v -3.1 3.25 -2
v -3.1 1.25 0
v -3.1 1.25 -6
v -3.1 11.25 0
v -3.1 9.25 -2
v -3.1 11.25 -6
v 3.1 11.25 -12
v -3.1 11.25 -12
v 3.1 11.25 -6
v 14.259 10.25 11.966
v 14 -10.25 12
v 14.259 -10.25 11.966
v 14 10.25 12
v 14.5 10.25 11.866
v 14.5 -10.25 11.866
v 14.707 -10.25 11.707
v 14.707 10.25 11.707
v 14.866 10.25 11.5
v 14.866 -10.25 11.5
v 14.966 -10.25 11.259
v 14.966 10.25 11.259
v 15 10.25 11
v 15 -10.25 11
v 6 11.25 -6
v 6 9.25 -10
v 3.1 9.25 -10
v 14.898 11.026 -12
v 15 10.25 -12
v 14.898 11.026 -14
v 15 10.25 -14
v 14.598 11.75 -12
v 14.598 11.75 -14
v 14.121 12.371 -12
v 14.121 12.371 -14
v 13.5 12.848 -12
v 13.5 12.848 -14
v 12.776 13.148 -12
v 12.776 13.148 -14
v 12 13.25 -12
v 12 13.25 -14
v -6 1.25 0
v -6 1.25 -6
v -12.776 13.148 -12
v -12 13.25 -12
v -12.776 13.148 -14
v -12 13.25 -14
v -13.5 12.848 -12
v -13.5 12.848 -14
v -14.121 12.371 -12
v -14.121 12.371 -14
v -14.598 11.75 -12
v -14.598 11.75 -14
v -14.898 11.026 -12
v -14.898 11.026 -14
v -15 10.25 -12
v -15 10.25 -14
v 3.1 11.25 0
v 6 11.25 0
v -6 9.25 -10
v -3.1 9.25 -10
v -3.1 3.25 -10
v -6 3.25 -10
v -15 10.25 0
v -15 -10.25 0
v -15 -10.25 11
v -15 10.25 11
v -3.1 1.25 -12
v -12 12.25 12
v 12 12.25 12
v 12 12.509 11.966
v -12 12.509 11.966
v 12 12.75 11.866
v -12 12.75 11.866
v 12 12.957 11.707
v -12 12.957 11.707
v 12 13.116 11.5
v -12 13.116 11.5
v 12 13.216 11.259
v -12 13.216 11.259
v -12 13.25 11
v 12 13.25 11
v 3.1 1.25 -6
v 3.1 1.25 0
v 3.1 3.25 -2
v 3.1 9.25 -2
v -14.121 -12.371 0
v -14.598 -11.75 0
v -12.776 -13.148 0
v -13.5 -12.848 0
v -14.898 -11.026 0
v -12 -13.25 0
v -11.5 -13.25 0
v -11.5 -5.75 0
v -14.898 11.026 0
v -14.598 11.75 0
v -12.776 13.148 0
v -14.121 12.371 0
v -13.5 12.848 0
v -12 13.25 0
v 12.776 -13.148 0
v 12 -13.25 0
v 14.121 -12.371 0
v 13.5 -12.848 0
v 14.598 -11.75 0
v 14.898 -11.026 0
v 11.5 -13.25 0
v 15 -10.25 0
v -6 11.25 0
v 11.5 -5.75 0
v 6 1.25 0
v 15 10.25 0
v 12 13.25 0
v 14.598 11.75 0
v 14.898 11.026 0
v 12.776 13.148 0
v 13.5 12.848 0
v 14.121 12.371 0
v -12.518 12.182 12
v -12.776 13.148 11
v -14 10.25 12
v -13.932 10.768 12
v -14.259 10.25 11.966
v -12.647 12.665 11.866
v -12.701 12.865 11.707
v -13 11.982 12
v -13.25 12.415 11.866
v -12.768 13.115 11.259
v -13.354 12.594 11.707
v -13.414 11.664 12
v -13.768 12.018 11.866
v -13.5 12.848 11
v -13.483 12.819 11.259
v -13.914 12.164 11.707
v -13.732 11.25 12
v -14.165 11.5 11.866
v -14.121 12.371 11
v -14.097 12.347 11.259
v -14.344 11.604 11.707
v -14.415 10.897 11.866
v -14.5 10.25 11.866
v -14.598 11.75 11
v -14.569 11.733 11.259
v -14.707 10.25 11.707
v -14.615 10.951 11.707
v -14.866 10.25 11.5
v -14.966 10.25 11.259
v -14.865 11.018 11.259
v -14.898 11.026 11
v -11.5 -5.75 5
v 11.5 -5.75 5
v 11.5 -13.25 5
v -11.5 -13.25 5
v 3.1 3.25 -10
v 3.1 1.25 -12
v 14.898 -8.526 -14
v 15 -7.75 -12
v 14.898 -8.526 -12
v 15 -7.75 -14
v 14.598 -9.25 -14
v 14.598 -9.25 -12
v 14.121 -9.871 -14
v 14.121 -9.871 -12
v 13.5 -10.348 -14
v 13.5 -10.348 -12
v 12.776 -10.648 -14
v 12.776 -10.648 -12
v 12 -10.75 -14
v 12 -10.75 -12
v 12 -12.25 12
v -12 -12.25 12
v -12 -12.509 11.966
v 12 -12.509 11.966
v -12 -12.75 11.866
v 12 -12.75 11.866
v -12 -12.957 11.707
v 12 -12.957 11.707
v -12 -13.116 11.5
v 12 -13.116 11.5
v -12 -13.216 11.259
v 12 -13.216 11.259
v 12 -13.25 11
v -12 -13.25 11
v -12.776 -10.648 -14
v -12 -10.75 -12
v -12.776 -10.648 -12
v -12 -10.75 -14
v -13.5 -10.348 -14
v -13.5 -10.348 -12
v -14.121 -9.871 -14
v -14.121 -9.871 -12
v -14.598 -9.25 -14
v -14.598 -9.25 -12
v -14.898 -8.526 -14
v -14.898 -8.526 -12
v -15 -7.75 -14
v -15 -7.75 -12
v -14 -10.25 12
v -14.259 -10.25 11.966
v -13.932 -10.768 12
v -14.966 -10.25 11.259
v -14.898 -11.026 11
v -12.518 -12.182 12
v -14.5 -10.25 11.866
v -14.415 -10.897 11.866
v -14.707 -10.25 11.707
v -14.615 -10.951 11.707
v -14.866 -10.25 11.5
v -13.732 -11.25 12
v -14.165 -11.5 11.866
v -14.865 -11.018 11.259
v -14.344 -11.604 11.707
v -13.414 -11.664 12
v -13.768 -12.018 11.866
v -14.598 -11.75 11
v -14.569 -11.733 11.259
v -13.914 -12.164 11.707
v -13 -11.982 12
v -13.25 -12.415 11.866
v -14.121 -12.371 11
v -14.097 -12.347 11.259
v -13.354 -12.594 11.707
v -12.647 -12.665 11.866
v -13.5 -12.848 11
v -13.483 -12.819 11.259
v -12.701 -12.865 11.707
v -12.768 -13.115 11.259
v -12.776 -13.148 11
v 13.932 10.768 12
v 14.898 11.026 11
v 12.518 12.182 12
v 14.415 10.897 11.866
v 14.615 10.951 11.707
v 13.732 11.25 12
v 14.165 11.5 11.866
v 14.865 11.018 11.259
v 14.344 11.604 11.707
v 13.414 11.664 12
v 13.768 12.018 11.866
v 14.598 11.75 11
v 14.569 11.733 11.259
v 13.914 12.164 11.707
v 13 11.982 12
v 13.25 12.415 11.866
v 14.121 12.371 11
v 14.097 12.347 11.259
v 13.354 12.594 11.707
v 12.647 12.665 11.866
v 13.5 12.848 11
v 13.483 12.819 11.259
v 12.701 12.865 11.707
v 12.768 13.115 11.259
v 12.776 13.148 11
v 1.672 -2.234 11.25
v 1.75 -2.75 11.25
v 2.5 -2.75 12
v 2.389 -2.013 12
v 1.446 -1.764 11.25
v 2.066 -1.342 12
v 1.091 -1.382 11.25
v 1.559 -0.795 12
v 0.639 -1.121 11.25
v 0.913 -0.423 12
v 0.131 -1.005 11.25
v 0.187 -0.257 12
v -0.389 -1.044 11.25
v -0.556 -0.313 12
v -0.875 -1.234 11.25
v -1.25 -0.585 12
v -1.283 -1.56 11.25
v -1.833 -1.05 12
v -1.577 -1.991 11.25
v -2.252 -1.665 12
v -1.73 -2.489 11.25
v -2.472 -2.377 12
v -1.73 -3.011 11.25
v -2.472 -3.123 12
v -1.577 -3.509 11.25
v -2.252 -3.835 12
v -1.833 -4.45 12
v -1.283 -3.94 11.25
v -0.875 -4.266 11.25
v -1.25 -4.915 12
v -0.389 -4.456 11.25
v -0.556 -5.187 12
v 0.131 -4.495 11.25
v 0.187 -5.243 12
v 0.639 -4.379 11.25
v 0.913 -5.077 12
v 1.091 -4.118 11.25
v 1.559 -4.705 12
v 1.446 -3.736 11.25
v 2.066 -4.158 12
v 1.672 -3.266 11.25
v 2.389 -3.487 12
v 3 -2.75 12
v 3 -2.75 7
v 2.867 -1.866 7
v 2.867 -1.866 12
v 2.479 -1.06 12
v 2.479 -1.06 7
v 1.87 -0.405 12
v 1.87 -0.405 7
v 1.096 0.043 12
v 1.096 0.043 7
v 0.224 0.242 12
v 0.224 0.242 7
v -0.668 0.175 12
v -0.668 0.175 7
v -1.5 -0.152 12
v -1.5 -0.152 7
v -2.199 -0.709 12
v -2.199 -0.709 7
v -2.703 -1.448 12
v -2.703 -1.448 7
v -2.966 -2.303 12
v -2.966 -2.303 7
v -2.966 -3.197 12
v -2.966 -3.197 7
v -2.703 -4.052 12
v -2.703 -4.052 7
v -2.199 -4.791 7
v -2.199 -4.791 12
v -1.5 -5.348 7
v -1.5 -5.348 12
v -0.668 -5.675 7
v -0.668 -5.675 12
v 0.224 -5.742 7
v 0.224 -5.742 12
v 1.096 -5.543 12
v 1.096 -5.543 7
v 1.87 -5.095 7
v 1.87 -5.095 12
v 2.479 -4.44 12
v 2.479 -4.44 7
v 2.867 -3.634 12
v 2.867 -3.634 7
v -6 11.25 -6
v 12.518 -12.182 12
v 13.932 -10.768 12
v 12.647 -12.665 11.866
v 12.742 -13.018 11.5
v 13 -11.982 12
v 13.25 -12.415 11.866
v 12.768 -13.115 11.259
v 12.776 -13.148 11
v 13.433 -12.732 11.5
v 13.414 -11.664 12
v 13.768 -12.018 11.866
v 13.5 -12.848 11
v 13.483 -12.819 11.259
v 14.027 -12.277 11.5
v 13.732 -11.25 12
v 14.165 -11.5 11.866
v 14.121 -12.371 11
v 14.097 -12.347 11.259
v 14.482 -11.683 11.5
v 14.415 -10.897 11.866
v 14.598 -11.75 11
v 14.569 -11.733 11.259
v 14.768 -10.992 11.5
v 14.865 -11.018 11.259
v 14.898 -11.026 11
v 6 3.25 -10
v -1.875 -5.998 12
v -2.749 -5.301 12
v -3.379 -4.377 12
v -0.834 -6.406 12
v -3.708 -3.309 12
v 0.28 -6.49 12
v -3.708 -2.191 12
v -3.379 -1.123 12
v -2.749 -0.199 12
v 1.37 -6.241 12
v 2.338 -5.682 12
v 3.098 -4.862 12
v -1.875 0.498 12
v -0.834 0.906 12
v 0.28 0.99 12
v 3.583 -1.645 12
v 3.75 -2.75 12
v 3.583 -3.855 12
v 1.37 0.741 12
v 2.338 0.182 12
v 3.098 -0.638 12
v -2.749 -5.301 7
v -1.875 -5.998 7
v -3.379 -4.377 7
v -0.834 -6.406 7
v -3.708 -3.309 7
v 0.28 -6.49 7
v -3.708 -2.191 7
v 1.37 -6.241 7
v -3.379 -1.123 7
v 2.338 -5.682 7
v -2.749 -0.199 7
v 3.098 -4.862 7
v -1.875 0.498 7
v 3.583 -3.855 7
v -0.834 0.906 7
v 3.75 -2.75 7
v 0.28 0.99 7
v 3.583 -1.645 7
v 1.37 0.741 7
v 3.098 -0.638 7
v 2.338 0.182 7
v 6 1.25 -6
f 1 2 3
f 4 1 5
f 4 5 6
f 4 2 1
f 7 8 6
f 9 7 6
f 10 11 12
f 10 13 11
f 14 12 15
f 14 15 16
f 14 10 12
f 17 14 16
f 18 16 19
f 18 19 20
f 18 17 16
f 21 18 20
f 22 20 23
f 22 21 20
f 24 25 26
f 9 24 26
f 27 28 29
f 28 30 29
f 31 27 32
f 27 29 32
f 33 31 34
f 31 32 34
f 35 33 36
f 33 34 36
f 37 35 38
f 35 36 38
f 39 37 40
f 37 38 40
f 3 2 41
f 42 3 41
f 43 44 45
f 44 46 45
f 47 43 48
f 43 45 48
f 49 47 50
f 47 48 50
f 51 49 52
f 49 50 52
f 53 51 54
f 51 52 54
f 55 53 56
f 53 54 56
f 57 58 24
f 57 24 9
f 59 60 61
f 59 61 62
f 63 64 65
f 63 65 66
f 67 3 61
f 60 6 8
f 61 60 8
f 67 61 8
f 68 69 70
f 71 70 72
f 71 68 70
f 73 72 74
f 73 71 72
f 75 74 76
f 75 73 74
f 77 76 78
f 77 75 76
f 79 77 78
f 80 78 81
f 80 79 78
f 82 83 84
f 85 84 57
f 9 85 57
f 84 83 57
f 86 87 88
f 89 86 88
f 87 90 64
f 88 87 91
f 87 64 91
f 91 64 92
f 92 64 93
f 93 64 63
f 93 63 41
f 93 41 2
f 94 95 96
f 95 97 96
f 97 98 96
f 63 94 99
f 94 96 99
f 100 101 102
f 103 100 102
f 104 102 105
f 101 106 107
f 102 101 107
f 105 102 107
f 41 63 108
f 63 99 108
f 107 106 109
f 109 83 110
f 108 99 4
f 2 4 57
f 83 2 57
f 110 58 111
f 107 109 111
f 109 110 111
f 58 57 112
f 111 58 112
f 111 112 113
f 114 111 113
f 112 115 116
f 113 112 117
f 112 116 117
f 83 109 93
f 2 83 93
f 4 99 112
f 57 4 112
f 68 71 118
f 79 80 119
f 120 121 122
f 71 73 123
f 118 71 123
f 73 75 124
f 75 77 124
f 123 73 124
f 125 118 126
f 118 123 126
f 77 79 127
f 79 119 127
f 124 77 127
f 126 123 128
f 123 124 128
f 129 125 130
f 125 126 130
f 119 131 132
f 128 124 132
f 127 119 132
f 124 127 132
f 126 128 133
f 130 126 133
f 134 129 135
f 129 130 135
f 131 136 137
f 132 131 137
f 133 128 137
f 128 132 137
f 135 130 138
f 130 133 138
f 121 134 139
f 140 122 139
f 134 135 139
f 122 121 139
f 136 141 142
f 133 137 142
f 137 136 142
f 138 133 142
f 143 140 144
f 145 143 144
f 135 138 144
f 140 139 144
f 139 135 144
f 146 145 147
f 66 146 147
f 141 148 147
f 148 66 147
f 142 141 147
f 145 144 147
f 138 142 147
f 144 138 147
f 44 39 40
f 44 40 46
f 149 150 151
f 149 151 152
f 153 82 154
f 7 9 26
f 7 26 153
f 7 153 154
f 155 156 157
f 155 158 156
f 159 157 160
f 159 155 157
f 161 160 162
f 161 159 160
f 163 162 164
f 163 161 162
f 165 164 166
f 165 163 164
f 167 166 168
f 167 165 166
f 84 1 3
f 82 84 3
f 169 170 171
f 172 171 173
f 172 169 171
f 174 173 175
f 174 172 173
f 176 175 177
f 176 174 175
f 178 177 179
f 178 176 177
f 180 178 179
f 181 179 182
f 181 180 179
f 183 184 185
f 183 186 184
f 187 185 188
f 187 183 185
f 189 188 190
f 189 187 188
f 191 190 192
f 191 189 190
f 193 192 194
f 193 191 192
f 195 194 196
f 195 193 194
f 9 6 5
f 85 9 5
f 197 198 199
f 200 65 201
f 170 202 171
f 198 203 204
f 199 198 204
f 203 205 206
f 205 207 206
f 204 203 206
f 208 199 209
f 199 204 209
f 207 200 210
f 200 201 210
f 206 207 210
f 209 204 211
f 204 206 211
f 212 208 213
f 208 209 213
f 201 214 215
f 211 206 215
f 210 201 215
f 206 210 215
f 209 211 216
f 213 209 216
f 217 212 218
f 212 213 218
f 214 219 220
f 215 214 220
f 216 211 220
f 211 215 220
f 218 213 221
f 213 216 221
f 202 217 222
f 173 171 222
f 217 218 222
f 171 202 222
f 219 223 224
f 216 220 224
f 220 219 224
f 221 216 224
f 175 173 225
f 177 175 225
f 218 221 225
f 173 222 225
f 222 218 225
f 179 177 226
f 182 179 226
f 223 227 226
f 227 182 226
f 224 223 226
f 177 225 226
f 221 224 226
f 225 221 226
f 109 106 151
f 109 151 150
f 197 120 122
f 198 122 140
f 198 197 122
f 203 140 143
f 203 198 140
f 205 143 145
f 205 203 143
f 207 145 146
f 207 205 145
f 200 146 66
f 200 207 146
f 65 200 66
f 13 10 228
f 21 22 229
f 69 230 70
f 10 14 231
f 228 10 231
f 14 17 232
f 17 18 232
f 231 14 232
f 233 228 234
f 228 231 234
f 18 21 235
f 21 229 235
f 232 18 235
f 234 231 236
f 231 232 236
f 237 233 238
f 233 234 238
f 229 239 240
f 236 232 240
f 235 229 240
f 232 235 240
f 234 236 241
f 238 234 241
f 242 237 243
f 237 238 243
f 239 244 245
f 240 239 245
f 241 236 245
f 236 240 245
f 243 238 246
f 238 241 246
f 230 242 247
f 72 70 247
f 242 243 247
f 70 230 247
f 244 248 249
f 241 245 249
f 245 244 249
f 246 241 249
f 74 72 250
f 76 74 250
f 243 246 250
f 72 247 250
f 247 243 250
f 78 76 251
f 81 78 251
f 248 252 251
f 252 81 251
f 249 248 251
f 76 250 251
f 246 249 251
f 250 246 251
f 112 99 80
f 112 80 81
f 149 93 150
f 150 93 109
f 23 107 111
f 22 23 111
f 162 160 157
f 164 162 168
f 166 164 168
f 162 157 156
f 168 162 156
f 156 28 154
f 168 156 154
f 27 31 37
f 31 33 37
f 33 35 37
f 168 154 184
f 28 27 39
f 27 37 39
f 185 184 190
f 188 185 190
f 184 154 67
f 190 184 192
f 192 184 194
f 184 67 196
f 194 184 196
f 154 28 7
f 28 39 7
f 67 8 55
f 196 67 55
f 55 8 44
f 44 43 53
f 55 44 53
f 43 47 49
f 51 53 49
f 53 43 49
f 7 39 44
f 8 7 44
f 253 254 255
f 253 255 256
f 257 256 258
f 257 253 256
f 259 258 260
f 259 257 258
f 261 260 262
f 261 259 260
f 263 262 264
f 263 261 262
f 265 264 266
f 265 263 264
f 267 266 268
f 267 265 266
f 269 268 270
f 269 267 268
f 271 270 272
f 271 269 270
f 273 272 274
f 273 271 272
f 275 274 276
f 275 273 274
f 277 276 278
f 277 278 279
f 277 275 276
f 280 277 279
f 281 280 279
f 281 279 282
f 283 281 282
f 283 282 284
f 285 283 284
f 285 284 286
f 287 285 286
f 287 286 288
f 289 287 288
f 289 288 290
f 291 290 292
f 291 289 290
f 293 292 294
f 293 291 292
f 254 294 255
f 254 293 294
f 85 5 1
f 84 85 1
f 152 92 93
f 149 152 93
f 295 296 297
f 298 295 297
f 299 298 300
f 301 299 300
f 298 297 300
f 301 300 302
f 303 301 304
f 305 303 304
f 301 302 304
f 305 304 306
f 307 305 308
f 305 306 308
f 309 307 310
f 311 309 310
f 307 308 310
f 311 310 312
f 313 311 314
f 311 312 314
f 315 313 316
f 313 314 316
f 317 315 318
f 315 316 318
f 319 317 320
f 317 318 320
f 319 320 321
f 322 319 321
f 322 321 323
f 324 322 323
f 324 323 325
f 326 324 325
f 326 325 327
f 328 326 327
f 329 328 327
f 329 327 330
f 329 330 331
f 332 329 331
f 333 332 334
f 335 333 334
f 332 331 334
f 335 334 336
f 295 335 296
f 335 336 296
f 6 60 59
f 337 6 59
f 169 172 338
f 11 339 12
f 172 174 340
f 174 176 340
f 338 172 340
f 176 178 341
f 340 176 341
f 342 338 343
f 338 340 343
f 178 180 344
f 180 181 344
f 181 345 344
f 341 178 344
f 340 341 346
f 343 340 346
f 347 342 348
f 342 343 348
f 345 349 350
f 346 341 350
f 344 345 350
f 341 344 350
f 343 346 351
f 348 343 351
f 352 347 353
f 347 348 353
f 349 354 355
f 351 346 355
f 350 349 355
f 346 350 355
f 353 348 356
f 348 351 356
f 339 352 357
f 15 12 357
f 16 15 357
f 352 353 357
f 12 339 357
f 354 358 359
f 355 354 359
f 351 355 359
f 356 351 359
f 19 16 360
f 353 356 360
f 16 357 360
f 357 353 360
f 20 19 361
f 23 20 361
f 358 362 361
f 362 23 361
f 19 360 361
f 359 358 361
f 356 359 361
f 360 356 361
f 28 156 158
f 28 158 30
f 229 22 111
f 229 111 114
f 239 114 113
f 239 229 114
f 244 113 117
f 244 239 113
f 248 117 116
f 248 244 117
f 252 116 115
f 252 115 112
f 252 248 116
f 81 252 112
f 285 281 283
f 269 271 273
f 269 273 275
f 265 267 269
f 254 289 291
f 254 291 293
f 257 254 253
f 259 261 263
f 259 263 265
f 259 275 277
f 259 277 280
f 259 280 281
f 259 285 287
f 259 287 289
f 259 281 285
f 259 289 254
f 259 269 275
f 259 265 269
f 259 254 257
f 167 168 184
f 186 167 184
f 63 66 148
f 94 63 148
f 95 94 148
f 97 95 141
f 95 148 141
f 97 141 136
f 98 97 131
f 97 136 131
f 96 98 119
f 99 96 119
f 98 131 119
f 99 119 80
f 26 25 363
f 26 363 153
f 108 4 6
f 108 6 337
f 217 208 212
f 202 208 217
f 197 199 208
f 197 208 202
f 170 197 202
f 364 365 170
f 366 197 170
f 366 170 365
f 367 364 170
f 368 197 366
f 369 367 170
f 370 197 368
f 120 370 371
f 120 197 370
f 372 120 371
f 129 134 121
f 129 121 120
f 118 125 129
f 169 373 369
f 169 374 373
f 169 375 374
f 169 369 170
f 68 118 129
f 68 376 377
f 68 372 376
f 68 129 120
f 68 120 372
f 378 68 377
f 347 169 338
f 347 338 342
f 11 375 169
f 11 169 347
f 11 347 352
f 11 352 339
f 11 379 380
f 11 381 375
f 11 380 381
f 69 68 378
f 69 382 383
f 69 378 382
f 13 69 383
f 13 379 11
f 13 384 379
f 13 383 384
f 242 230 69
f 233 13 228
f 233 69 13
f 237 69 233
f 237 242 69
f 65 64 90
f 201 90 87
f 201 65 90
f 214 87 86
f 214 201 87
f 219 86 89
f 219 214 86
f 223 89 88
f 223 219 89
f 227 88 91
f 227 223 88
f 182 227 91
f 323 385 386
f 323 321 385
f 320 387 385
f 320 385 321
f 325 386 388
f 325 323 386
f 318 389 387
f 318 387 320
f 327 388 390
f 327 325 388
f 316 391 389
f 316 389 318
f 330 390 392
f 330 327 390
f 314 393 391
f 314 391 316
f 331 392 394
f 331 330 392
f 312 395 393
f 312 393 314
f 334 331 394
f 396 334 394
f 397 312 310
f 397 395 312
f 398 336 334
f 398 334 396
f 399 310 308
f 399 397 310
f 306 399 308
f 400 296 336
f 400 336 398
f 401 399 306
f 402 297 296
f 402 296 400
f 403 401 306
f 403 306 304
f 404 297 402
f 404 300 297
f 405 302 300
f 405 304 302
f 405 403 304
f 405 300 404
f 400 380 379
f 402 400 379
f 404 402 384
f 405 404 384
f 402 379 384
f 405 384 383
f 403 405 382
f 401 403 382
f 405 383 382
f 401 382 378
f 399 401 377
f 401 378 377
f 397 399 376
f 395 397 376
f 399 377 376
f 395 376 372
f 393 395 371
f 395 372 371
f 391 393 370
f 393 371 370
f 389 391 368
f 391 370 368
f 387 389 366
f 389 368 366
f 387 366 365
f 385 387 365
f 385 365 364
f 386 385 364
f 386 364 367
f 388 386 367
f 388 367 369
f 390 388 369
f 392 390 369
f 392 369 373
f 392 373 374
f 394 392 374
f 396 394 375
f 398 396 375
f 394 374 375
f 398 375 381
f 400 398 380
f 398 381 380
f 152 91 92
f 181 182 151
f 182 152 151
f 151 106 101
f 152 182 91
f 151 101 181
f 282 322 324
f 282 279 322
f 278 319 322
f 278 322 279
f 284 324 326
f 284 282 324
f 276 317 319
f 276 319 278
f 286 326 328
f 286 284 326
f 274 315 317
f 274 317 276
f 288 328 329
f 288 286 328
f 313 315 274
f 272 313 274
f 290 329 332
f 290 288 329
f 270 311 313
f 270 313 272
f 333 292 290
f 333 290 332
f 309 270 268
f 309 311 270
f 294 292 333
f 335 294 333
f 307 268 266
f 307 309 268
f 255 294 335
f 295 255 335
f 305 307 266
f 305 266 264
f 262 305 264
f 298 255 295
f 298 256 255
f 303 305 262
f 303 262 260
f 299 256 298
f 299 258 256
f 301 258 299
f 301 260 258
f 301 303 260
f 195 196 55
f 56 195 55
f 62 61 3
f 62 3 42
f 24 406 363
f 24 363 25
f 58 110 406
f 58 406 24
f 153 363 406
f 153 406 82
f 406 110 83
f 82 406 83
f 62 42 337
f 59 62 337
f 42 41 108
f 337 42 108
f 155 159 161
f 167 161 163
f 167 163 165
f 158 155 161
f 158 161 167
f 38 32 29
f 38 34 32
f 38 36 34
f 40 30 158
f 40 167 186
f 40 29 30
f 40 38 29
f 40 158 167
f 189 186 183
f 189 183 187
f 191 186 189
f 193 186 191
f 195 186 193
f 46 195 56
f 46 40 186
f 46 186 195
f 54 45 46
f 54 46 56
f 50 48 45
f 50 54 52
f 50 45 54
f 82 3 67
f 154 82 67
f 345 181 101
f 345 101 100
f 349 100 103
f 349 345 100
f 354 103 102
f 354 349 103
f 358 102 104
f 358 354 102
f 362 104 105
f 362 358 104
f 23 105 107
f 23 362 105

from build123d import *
from OCP.BRepFilletAPI import BRepFilletAPI_MakeChamfer

# Parameters (mm, degrees)
SKETCH1_W           = 30
SKETCH1_H           = 26.5
BOSS_EXTRUDE1_DEPTH = 12
FILLET1_R           = 3
FILLET2_R           = 1
SKETCH2_R           = 3.75
CUT_EXTRUDE1_DEPTH  = 5
SKETCH3_R           = 3
BOSS_EXTRUDE2_DEPTH = 5
SKETCH4_R           = 1.75
CUT_EXTRUDE2_DEPTH  = 0.75
CHAMFER1_SIZE       = 0.75
SKETCH5_W           = 2.9
SKETCH5_H           = 10
BOSS_EXTRUDE3_DEPTH = 10
CHAMFER2_SIZE       = 4
CHAMFER2_SIZE2      = 2
BOSS_EXTRUDE4_DEPTH = 6.2
SKETCH7_W           = 30
SKETCH7_H           = 24
BOSS_EXTRUDE5_DEPTH = 2
FILLET3_R           = 3
SKETCH8_W           = 11.5
SKETCH8_H           = 7.5
CUT_EXTRUDE3_DEPTH  = 5


with BuildPart() as part:
    # Sketch1 → Boss-Extrude1 (new body)
    with BuildSketch(Plane.XY):
        Rectangle(SKETCH1_W, SKETCH1_H)
    extrude(amount=BOSS_EXTRUDE1_DEPTH)

    # Fillet1
    fillet1_edges = [part.edges().sort_by_distance(p)[0] for p in [
        (-15, -13.25, 6),
        (15, -13.25, 6),
        (15, 13.25, 6),
        (-15, 13.25, 6),
    ]]
    fillet(fillet1_edges, radius=FILLET1_R)

    # Fillet2
    fillet2_edges = [part.edges().sort_by_distance(p)[0] for p in [
        (15, 0, 12),
        (0, -13.25, 12),
        (-15, 0, 12),
        (0, 13.25, 12),
        (-14.121320344, 12.371320344, 12),
        (14.121320344, 12.371320344, 12),
        (-14.121320344, -12.371320344, 12),
        (14.121320344, -12.371320344, 12),
    ]]
    fillet(fillet2_edges, radius=FILLET2_R)

    # Sketch2 → Cut-Extrude1 (cut)
    with BuildSketch(Plane.XY.offset(12)):
        with Locations((0, -2.75)):
            Circle(SKETCH2_R)
    extrude(amount=-CUT_EXTRUDE1_DEPTH, mode=Mode.SUBTRACT)

    # Sketch3 → Boss-Extrude2 (add)
    with BuildSketch(Plane.XY.offset(7)):
        with Locations((0, -2.75)):
            Circle(SKETCH3_R)
    extrude(amount=BOSS_EXTRUDE2_DEPTH)

    # Sketch4 → Cut-Extrude2 (cut)
    with BuildSketch(Plane.XY.offset(12)):
        with Locations((0, -2.75)):
            Circle(SKETCH4_R)
    extrude(amount=-CUT_EXTRUDE2_DEPTH, mode=Mode.SUBTRACT)

    # Chamfer1
    chamfer1_edges = [part.edges().sort_by_distance(p)[0] for p in [
        (-1.75, -2.75, 12),
    ]]
    chamfer(chamfer1_edges, length=CHAMFER1_SIZE - 0.0001)  # a hair under: the kernel refuses the full size

    # Sketch5 → Boss-Extrude3 (add)
    with BuildSketch(Plane(origin=(0, 0, 0), x_dir=(-1, 0, 0), z_dir=(0, 0, -1))):
        with Locations((-4.55, 6.25)):
            Rectangle(SKETCH5_W, SKETCH5_H)
        with Locations((4.55, 6.25)):
            Rectangle(SKETCH5_W, SKETCH5_H)
    extrude(amount=BOSS_EXTRUDE3_DEPTH)

    # Chamfer2: one chamfer whose edges measure the first distance from different faces: ONE call of the kernel's chamfer builder (chamfer() names one face for all edges)
    chamfer2_edges_1 = [part.edges().sort_by_distance(p)[0] for p in [
        (-4.55, 1.25, -10),
    ]]
    chamfer2_side_1 = [part.faces().sort_by_distance(p)[0] for p in [
        (-4.55, 1.25, -5),
    ]]
    chamfer2_edges_2 = [part.edges().sort_by_distance(p)[0] for p in [
        (4.55, 1.25, -10),
    ]]
    chamfer2_side_2 = [part.faces().sort_by_distance(p)[0] for p in [
        (4.55, 1.25, -5),
    ]]
    chamfer2_edges_3 = [part.edges().sort_by_distance(p)[0] for p in [
        (4.55, 11.25, -10),
    ]]
    chamfer2_side_3 = [part.faces().sort_by_distance(p)[0] for p in [
        (4.55, 11.25, -5),
    ]]
    chamfer2_edges_4 = [part.edges().sort_by_distance(p)[0] for p in [
        (-4.55, 11.25, -10),
    ]]
    chamfer2_side_4 = [part.faces().sort_by_distance(p)[0] for p in [
        (-4.55, 11.25, -5),
    ]]
    chamfer2 = BRepFilletAPI_MakeChamfer(part.part.solid().wrapped)
    for e in chamfer2_edges_1:
        chamfer2.Add(CHAMFER2_SIZE, CHAMFER2_SIZE2, e.wrapped, chamfer2_side_1[0].wrapped)  # the first distance lies on this face
    for e in chamfer2_edges_2:
        chamfer2.Add(CHAMFER2_SIZE, CHAMFER2_SIZE2, e.wrapped, chamfer2_side_2[0].wrapped)  # the first distance lies on this face
    for e in chamfer2_edges_3:
        chamfer2.Add(CHAMFER2_SIZE, CHAMFER2_SIZE2, e.wrapped, chamfer2_side_3[0].wrapped)  # the first distance lies on this face
    for e in chamfer2_edges_4:
        chamfer2.Add(CHAMFER2_SIZE, CHAMFER2_SIZE2, e.wrapped, chamfer2_side_4[0].wrapped)  # the first distance lies on this face
    add(Compound.cast(chamfer2.Shape()), mode=Mode.REPLACE)

    # Sketch6 → Boss-Extrude4 (add)
    with BuildSketch(Plane(origin=(-3.1, 0, 0), x_dir=(0, 0, -1), z_dir=(1, 0, 0))):
        Polygon((2, 9.25), (2, 3.25), (6, 1.25), (12, 1.25), (12, 11.25), (6, 11.25), align=None)
    extrude(amount=BOSS_EXTRUDE4_DEPTH)

    # Sketch7 → Boss-Extrude5 (add)
    with BuildSketch(Plane(origin=(0, 0, -12), x_dir=(-1, 0, 0), z_dir=(0, 0, -1))):
        with Locations((0, 1.25)):
            Rectangle(SKETCH7_W, SKETCH7_H)
    extrude(amount=BOSS_EXTRUDE5_DEPTH)

    # Fillet3
    fillet3_edges = [part.edges().sort_by_distance(p)[0] for p in [
        (-15, -10.75, -13),
        (-15, 13.25, -13),
        (15, 13.25, -13),
        (15, -10.75, -13),
    ]]
    fillet(fillet3_edges, radius=FILLET3_R)

    # Sketch8 → Cut-Extrude3 (cut)
    with BuildSketch(Plane(origin=(0, 0, 0), x_dir=(-1, 0, 0), z_dir=(0, 0, -1))):
        with Locations((5.75, -9.5)):
            Rectangle(SKETCH8_W, SKETCH8_H)
        with Locations((-5.75, -9.5)):
            Rectangle(SKETCH8_W, SKETCH8_H)
    extrude(amount=-CUT_EXTRUDE3_DEPTH, mode=Mode.SUBTRACT)


solid = part.part
